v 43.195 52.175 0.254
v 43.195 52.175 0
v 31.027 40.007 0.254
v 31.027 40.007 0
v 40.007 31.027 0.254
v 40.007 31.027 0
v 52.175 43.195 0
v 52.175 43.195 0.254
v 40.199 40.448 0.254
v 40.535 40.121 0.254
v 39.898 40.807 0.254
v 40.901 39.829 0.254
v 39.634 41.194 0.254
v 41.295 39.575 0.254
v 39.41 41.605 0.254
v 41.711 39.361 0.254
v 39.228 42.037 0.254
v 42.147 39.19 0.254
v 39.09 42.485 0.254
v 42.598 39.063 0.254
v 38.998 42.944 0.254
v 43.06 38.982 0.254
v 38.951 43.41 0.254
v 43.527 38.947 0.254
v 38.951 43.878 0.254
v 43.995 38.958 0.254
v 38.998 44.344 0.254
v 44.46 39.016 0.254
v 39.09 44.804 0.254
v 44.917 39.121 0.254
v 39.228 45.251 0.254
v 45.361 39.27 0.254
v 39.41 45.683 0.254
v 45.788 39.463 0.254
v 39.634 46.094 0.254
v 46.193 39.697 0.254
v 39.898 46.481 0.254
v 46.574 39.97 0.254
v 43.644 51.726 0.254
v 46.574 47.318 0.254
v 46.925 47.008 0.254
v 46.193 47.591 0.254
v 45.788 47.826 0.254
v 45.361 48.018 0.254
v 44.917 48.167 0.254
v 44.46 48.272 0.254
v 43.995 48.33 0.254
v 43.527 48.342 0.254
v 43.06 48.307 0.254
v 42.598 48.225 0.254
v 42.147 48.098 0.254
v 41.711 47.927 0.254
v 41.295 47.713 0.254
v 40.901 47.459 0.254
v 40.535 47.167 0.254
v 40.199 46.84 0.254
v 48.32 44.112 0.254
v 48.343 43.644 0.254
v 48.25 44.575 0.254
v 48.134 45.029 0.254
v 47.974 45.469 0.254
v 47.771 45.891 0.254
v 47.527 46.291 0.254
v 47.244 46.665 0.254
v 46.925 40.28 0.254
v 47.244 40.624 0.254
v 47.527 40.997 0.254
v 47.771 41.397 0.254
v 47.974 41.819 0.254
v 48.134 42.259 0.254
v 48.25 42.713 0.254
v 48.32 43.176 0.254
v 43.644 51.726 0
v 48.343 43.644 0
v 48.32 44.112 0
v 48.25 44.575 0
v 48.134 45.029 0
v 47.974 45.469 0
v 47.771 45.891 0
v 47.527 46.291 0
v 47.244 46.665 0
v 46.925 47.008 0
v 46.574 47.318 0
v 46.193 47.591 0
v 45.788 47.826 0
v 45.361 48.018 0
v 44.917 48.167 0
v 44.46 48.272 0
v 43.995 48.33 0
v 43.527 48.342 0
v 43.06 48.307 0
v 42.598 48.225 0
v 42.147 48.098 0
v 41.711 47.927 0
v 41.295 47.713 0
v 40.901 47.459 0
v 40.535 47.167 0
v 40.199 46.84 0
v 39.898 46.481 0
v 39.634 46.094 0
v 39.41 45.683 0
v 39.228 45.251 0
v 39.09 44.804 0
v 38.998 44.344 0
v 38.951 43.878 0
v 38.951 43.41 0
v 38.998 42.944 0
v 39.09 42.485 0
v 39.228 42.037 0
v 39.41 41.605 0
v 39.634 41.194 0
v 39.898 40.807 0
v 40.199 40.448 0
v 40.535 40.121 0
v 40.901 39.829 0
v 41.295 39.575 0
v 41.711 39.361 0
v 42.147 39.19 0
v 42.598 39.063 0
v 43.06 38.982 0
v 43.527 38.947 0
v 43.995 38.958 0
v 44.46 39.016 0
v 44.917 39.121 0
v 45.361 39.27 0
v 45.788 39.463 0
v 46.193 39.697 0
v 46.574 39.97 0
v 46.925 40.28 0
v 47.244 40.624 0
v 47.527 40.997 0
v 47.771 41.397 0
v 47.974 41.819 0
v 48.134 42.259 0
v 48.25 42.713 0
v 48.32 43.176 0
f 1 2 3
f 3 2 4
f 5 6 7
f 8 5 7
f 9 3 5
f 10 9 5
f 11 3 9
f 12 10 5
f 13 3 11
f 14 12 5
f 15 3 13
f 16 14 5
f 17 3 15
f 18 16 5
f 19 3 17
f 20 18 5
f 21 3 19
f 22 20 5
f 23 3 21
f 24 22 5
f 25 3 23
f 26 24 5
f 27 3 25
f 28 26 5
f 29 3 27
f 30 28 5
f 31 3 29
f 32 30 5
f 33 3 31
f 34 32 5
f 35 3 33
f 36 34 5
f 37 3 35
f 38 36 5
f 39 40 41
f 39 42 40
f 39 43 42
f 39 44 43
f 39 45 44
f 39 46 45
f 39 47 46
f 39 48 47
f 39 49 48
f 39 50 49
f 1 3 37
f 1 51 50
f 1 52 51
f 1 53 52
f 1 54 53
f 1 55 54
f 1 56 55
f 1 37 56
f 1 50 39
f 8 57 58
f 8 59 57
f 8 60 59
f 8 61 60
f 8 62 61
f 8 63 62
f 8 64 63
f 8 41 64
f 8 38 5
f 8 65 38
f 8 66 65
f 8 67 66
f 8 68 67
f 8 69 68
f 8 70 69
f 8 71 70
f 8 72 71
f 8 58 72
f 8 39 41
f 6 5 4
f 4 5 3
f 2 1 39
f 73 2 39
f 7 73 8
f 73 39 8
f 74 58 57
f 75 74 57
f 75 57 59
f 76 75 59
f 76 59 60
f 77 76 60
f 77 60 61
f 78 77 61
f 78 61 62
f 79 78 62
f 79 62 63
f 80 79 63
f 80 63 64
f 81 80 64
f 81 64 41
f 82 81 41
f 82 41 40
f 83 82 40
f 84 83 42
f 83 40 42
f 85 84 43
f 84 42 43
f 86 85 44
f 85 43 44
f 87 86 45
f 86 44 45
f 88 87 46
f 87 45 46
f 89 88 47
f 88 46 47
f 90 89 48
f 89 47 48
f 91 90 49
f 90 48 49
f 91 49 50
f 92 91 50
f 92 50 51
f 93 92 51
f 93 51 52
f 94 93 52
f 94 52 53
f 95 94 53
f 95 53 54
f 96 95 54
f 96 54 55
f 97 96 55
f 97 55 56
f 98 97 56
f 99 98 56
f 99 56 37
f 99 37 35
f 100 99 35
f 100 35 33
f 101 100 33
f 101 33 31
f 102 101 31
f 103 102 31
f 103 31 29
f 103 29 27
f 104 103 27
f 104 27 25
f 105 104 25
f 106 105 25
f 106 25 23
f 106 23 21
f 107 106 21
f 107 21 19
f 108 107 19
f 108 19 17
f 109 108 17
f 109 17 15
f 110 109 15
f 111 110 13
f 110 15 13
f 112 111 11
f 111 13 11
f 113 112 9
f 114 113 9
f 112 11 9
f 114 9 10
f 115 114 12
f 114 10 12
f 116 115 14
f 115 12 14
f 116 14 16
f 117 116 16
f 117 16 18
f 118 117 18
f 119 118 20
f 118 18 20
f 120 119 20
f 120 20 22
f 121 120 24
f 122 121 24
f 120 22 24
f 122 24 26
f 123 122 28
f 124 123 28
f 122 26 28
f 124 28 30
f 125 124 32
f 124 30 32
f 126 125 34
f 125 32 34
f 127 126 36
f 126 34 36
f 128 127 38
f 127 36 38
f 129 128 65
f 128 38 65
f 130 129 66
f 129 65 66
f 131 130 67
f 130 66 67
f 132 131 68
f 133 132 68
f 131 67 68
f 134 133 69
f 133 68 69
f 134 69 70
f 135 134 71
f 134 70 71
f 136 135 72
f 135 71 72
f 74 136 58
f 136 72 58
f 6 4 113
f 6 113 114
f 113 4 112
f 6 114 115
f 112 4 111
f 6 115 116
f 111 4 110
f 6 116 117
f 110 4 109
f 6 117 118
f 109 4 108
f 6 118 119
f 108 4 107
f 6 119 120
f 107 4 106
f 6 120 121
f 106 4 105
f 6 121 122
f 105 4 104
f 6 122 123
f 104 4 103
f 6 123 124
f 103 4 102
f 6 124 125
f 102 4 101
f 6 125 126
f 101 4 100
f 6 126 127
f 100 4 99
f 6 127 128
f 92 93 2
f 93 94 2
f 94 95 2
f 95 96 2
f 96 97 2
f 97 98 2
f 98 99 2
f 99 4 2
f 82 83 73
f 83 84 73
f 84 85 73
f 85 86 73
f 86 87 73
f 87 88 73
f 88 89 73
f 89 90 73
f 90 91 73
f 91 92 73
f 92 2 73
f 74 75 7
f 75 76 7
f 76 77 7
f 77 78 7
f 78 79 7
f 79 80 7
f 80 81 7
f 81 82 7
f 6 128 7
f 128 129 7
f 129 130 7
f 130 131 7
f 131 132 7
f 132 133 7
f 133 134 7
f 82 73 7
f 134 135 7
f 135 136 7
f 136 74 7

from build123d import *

# Parameters (mm, degrees)
BOSS_EXTRUDE1_DEPTH = 0.254
SKETCH2_R           = 4.699
CUT_EXTRUDE1_DEPTH  = 1.254
SKETCH3_W           = 2.54
SKETCH3_H           = 0.635
CUT_EXTRUDE2_DEPTH  = 1.254
SKETCH5_OUTSIDE_W   = 121.447
SKETCH5_OUTSIDE_H   = 109.618
CUT_EXTRUDE5_DEPTH  = 1.254


with BuildPart() as part:
    # Sketch1 → Boss-Extrude1 (new body)
    with BuildSketch(Plane.XY):
        with BuildLine():
            Line((67.21146711, 76.191723231), (8.696654013, 17.676910134))
            Line((8.696654013, 17.676910134), (7.228954972, 14.133571205))
            ThreePointArc((7.228954972, 14.133571205), (14.666587579, 6.075099489), (15.105587123, -4.88230096))
            Line((15.105587123, -4.88230096), (18.648926052, -6.35))
            Line((18.648926052, -6.35), (101.401368334, -6.35))
            ThreePointArc((101.401368334, -6.35), (93.866160503, 38.880636728), (67.21146711, 76.191723231))
        make_face()
        with BuildLine():
            Line((88.672924278, 6.35), (27.86051193, 6.35))
            ThreePointArc((27.86051193, 6.35), (26.399857642, 10.93517908), (24.190484974, 15.210228852))
            Line((24.190484974, 15.210228852), (67.191354125, 58.211098004))
            ThreePointArc((67.191354125, 58.211098004), (82.13289044, 34.020557137), (88.672924278, 6.35))
        make_face(mode=Mode.SUBTRACT)
    extrude(amount=BOSS_EXTRUDE1_DEPTH)

    # Sketch2 → Cut-Extrude1 (cut, through all)
    with BuildSketch(Plane.XY.offset(0.254)):
        with Locations((22.225, 0)):
            Circle(SKETCH2_R)
        with Locations((36.195, 0)):
            Circle(SKETCH2_R)
        with Locations((61.722, 0)):
            Circle(SKETCH2_R)
        with Locations((75.692, 0)):
            Circle(SKETCH2_R)
        with Locations((95.25, 0)):
            Circle(SKETCH2_R)
        with Locations((15.715448212, 15.715448212)):
            Circle(SKETCH2_R)
        with Locations((25.593729945, 25.593729945)):
            Circle(SKETCH2_R)
        with Locations((43.644044748, 43.644044748)):
            Circle(SKETCH2_R)
        with Locations((53.522326482, 53.522326482)):
            Circle(SKETCH2_R)
        with Locations((92.004434954, 24.652514046)):
            Circle(SKETCH2_R)
        with Locations((82.48891971, 47.625)):
            Circle(SKETCH2_R)
        with Locations((67.351920908, 67.351920908)):
            Circle(SKETCH2_R)
    extrude(amount=-CUT_EXTRUDE1_DEPTH, mode=Mode.SUBTRACT)

    # Sketch3 → Cut-Extrude2 (cut, through all)
    with BuildSketch(Plane.XY.offset(0.254)):
        Polygon((15.266435406, 24.246691527), (17.06248663, 26.042742751), (17.511499436, 25.593729945), (15.715448212, 23.797678721), align=None)
        Polygon((44.991083167, 53.971339288), (43.195031942, 52.175288063), (43.644044748, 51.726275257), (45.440095973, 53.522326482), align=None)
        with Locations((29.21, -6.0325)):
            Rectangle(SKETCH3_W, SKETCH3_H)
        with Locations((68.707, -6.0325)):
            Rectangle(SKETCH3_W, SKETCH3_H)
        Polygon((29.230733674, 38.210989795), (31.026784898, 40.007041019), (31.475797704, 39.558028213), (29.67974648, 37.761976989), align=None)
        Polygon((56.845021246, 65.825277367), (55.048970022, 64.029226143), (55.497982828, 63.580213337), (57.294034052, 65.376264561), align=None)
        with Locations((48.9585, -6.0325)):
            Rectangle(SKETCH3_W, SKETCH3_H)
        with Locations((85.471, -6.0325)):
            Rectangle(SKETCH3_W, SKETCH3_H)
        Polygon((99.935462164, 14.437711971), (100.266998693, 11.919442024), (101.526133667, 12.085210288), (101.194597138, 14.603480236), align=None)
        Polygon((93.765504959, 37.464305742), (94.938831965, 37.950313702), (93.966816047, 40.296967714), (92.793489041, 39.810959755), align=None)
        Polygon((79.327792988, 62.471156422), (80.874047017, 60.456038938), (81.88160576, 61.229165953), (80.33535173, 63.244283437), align=None)
        Polygon((13.593916116, 7.005422516), (14.565932035, 4.658768503), (15.739259041, 5.144776462), (14.767243123, 7.491430475), align=None)
    extrude(amount=-CUT_EXTRUDE2_DEPTH, mode=Mode.SUBTRACT)

    # Sketch5 outside → Cut-Extrude5 (cut, through all)
    with BuildSketch(Plane.XY.offset(0.254)):
        with Locations((54.4145, 34.921)):
            Rectangle(SKETCH5_OUTSIDE_W, SKETCH5_OUTSIDE_H)
        Polygon((30.128759286, 40.905066631), (42.29700633, 53.073313676), (53.073313676, 42.29700633), (40.905066631, 30.128759286), align=None, mode=Mode.SUBTRACT)
    extrude(amount=-CUT_EXTRUDE5_DEPTH, mode=Mode.SUBTRACT)


solid = part.part
